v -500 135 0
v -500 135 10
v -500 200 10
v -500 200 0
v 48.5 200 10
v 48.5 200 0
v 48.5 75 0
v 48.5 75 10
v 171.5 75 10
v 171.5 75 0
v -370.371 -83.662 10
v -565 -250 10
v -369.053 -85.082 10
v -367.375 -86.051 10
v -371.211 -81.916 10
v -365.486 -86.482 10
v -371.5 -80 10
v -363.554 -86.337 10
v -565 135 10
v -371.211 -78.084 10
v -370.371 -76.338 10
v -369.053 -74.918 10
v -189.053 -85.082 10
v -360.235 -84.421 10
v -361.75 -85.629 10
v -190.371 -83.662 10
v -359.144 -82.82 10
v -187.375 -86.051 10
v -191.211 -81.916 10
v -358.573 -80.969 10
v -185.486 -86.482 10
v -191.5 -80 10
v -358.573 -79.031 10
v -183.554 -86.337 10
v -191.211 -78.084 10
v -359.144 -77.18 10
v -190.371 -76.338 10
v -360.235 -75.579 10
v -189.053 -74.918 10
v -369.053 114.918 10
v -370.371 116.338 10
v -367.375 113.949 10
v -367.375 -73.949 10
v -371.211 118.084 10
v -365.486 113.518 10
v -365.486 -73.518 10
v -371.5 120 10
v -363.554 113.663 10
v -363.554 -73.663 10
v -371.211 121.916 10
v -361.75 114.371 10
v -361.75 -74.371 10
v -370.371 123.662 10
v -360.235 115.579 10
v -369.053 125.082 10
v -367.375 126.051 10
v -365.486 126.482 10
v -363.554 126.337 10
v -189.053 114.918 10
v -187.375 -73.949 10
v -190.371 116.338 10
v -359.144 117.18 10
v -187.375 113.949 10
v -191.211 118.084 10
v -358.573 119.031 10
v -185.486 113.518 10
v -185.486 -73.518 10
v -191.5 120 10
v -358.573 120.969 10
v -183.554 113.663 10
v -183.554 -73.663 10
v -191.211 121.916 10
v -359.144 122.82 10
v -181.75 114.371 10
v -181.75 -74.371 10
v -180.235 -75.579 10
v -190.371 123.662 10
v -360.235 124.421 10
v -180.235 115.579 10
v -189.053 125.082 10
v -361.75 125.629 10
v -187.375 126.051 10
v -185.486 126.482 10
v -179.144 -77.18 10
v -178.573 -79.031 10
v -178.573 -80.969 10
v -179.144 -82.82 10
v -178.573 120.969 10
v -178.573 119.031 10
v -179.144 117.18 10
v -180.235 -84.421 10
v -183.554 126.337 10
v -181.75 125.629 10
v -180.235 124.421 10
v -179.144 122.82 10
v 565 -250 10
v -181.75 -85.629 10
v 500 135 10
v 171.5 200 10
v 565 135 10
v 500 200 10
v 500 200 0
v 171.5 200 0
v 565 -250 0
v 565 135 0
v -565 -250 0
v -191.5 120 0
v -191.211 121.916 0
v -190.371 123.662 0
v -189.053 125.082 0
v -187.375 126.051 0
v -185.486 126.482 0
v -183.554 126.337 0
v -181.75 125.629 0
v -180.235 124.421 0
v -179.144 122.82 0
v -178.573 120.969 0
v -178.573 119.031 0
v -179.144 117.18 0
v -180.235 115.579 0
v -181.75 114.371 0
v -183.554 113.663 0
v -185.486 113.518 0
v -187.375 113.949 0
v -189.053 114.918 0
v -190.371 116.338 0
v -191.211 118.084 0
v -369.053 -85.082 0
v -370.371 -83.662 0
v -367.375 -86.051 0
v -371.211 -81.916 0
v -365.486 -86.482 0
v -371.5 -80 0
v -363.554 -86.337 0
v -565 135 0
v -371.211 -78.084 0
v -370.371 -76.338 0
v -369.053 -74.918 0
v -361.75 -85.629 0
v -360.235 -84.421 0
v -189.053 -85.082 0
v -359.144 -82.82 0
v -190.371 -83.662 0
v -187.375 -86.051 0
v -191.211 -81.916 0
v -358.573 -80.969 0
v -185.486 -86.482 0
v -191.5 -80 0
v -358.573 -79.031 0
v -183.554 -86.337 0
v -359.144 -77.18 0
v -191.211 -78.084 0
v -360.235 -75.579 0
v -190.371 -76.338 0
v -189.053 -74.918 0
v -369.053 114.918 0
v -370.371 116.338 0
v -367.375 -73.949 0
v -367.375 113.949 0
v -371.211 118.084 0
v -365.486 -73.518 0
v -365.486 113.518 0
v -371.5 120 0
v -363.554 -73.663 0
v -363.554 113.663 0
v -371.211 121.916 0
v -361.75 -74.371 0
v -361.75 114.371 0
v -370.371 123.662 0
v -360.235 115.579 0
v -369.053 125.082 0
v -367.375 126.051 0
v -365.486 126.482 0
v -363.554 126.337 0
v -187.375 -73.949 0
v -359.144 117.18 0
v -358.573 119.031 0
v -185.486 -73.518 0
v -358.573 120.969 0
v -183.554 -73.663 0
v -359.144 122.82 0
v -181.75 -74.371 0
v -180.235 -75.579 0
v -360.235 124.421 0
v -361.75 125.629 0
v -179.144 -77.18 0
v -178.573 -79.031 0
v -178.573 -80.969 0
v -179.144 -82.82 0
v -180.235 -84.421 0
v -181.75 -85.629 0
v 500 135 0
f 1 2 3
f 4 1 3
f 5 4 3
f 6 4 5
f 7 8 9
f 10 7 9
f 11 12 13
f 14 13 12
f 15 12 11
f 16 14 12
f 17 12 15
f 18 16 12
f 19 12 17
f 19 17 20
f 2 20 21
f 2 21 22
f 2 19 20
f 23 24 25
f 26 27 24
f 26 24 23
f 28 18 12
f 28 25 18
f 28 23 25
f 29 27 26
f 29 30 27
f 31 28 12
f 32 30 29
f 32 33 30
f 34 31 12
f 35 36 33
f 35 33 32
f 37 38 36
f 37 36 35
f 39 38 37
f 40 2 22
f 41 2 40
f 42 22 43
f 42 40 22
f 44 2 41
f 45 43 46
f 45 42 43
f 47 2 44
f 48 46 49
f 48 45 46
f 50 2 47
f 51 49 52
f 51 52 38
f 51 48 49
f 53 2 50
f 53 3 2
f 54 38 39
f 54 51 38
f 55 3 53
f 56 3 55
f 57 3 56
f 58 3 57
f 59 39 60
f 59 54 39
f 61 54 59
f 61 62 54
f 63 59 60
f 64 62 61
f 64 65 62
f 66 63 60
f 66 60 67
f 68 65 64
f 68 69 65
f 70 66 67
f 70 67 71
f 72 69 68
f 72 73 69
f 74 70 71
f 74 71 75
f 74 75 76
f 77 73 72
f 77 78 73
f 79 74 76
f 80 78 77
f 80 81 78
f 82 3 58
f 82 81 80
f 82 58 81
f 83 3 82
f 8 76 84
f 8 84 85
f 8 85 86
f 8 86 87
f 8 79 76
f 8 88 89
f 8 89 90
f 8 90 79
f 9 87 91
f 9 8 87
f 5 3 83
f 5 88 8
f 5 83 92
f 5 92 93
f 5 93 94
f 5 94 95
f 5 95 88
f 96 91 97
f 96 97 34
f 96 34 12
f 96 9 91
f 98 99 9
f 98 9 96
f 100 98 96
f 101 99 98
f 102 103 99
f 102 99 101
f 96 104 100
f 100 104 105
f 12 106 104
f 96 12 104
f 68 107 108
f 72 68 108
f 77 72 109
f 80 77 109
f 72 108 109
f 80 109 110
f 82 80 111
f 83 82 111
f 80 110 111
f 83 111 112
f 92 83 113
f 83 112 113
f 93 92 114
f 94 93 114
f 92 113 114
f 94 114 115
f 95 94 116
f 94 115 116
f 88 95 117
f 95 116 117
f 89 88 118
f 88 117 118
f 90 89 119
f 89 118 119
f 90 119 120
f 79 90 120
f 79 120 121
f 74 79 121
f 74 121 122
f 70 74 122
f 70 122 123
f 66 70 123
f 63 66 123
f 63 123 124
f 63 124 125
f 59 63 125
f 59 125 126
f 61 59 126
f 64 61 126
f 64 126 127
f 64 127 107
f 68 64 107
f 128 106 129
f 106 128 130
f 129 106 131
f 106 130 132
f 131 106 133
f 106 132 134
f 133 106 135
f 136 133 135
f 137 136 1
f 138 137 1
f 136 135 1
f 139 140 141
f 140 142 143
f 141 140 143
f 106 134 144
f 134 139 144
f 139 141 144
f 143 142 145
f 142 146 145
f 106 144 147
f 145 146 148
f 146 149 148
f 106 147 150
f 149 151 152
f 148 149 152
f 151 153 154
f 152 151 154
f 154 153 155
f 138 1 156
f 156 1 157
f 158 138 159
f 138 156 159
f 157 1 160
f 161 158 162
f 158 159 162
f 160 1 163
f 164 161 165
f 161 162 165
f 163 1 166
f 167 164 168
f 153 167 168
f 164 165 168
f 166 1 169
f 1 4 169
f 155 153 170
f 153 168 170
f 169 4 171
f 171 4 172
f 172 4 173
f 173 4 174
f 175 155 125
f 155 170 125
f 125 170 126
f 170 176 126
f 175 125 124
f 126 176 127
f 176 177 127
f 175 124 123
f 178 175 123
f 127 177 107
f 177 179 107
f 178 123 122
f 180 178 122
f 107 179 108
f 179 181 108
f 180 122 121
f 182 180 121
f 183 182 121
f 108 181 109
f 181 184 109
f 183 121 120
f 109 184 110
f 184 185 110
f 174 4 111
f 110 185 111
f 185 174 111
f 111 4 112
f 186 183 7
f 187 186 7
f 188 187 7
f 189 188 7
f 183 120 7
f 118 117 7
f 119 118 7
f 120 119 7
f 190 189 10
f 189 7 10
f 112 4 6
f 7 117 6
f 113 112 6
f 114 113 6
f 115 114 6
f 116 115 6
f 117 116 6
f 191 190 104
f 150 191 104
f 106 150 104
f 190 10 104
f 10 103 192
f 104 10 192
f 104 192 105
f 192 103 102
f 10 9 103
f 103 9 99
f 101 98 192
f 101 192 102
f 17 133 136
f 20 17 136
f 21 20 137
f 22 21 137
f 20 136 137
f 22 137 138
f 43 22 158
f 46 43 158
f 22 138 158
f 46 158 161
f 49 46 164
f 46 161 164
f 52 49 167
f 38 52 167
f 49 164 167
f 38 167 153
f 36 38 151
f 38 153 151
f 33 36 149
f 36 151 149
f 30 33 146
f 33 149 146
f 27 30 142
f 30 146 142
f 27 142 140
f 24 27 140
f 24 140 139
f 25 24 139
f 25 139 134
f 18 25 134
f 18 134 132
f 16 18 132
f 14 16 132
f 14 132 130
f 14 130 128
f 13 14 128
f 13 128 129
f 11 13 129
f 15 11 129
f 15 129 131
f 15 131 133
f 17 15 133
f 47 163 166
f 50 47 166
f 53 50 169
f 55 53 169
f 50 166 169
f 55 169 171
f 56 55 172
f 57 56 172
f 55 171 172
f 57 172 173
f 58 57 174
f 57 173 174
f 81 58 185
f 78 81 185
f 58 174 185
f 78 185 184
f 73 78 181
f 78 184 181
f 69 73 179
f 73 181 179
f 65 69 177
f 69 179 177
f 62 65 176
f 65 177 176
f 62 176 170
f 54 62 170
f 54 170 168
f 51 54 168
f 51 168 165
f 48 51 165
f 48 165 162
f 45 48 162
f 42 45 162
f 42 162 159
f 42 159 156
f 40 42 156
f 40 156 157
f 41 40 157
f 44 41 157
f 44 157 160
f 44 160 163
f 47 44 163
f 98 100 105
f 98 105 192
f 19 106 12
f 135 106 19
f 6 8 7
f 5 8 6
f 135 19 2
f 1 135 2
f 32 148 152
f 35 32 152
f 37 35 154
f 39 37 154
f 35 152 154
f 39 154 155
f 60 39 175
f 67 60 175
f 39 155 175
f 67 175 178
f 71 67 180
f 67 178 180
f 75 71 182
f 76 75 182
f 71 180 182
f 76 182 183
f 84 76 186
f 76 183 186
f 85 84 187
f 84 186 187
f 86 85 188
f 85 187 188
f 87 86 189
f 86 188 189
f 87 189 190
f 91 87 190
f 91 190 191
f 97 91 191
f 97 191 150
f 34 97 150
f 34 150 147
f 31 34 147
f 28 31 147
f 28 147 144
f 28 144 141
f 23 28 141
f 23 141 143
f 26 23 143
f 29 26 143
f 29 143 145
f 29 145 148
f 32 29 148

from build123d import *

# Parameters (mm, degrees)
SKETCH1_W                  = 1130
SKETCH1_H                  = 450
BOSS_EXTRUDE1_DEPTH        = 10
SKETCH2_W                  = 65
SKETCH2_H                  = 65
CUT_EXTRUDE1_DEPTH         = 11
SKETCH3_W                  = 123
SKETCH3_H                  = 125
CUT_EXTRUDE2_DEPTH         = 11
F_13_0_13_DIAMETER_HOLE1_D = 13


with BuildPart() as part:
    # Sketch1 → Boss-Extrude1 (new body)
    with BuildSketch(Plane.XY):
        with Locations((0, -25)):
            Rectangle(SKETCH1_W, SKETCH1_H)
    extrude(amount=BOSS_EXTRUDE1_DEPTH)

    # Sketch2 → Cut-Extrude1 (cut, through all)
    with BuildSketch(Plane.XY.offset(10)):
        with Locations((-532.5, 167.5)):
            Rectangle(SKETCH2_W, SKETCH2_H)
    cut_extrude1 = extrude(amount=-CUT_EXTRUDE1_DEPTH, mode=Mode.SUBTRACT)

    # Mirror1: Cut-Extrude1 across plane
    add(cut_extrude1.mirror(Plane(origin=(0, 0, 0), x_dir=(0, 0, 1), z_dir=(1, 0, 0))), mode=Mode.SUBTRACT)

    # Sketch3 → Cut-Extrude2 (cut, through all)
    with BuildSketch(Plane.XY.offset(10)):
        with Locations((110, 137.5)):
            Rectangle(SKETCH3_W, SKETCH3_H)
    extrude(amount=-CUT_EXTRUDE2_DEPTH, mode=Mode.SUBTRACT)

    # Ø13.0 (13) Diameter Hole1 (through all)
    with Locations(Plane.XY.offset(10)):
        with Locations((-365, 120), (-185, 120), (-185, -80), (-365, -80)):
            Hole(F_13_0_13_DIAMETER_HOLE1_D / 2)


solid = part.part
